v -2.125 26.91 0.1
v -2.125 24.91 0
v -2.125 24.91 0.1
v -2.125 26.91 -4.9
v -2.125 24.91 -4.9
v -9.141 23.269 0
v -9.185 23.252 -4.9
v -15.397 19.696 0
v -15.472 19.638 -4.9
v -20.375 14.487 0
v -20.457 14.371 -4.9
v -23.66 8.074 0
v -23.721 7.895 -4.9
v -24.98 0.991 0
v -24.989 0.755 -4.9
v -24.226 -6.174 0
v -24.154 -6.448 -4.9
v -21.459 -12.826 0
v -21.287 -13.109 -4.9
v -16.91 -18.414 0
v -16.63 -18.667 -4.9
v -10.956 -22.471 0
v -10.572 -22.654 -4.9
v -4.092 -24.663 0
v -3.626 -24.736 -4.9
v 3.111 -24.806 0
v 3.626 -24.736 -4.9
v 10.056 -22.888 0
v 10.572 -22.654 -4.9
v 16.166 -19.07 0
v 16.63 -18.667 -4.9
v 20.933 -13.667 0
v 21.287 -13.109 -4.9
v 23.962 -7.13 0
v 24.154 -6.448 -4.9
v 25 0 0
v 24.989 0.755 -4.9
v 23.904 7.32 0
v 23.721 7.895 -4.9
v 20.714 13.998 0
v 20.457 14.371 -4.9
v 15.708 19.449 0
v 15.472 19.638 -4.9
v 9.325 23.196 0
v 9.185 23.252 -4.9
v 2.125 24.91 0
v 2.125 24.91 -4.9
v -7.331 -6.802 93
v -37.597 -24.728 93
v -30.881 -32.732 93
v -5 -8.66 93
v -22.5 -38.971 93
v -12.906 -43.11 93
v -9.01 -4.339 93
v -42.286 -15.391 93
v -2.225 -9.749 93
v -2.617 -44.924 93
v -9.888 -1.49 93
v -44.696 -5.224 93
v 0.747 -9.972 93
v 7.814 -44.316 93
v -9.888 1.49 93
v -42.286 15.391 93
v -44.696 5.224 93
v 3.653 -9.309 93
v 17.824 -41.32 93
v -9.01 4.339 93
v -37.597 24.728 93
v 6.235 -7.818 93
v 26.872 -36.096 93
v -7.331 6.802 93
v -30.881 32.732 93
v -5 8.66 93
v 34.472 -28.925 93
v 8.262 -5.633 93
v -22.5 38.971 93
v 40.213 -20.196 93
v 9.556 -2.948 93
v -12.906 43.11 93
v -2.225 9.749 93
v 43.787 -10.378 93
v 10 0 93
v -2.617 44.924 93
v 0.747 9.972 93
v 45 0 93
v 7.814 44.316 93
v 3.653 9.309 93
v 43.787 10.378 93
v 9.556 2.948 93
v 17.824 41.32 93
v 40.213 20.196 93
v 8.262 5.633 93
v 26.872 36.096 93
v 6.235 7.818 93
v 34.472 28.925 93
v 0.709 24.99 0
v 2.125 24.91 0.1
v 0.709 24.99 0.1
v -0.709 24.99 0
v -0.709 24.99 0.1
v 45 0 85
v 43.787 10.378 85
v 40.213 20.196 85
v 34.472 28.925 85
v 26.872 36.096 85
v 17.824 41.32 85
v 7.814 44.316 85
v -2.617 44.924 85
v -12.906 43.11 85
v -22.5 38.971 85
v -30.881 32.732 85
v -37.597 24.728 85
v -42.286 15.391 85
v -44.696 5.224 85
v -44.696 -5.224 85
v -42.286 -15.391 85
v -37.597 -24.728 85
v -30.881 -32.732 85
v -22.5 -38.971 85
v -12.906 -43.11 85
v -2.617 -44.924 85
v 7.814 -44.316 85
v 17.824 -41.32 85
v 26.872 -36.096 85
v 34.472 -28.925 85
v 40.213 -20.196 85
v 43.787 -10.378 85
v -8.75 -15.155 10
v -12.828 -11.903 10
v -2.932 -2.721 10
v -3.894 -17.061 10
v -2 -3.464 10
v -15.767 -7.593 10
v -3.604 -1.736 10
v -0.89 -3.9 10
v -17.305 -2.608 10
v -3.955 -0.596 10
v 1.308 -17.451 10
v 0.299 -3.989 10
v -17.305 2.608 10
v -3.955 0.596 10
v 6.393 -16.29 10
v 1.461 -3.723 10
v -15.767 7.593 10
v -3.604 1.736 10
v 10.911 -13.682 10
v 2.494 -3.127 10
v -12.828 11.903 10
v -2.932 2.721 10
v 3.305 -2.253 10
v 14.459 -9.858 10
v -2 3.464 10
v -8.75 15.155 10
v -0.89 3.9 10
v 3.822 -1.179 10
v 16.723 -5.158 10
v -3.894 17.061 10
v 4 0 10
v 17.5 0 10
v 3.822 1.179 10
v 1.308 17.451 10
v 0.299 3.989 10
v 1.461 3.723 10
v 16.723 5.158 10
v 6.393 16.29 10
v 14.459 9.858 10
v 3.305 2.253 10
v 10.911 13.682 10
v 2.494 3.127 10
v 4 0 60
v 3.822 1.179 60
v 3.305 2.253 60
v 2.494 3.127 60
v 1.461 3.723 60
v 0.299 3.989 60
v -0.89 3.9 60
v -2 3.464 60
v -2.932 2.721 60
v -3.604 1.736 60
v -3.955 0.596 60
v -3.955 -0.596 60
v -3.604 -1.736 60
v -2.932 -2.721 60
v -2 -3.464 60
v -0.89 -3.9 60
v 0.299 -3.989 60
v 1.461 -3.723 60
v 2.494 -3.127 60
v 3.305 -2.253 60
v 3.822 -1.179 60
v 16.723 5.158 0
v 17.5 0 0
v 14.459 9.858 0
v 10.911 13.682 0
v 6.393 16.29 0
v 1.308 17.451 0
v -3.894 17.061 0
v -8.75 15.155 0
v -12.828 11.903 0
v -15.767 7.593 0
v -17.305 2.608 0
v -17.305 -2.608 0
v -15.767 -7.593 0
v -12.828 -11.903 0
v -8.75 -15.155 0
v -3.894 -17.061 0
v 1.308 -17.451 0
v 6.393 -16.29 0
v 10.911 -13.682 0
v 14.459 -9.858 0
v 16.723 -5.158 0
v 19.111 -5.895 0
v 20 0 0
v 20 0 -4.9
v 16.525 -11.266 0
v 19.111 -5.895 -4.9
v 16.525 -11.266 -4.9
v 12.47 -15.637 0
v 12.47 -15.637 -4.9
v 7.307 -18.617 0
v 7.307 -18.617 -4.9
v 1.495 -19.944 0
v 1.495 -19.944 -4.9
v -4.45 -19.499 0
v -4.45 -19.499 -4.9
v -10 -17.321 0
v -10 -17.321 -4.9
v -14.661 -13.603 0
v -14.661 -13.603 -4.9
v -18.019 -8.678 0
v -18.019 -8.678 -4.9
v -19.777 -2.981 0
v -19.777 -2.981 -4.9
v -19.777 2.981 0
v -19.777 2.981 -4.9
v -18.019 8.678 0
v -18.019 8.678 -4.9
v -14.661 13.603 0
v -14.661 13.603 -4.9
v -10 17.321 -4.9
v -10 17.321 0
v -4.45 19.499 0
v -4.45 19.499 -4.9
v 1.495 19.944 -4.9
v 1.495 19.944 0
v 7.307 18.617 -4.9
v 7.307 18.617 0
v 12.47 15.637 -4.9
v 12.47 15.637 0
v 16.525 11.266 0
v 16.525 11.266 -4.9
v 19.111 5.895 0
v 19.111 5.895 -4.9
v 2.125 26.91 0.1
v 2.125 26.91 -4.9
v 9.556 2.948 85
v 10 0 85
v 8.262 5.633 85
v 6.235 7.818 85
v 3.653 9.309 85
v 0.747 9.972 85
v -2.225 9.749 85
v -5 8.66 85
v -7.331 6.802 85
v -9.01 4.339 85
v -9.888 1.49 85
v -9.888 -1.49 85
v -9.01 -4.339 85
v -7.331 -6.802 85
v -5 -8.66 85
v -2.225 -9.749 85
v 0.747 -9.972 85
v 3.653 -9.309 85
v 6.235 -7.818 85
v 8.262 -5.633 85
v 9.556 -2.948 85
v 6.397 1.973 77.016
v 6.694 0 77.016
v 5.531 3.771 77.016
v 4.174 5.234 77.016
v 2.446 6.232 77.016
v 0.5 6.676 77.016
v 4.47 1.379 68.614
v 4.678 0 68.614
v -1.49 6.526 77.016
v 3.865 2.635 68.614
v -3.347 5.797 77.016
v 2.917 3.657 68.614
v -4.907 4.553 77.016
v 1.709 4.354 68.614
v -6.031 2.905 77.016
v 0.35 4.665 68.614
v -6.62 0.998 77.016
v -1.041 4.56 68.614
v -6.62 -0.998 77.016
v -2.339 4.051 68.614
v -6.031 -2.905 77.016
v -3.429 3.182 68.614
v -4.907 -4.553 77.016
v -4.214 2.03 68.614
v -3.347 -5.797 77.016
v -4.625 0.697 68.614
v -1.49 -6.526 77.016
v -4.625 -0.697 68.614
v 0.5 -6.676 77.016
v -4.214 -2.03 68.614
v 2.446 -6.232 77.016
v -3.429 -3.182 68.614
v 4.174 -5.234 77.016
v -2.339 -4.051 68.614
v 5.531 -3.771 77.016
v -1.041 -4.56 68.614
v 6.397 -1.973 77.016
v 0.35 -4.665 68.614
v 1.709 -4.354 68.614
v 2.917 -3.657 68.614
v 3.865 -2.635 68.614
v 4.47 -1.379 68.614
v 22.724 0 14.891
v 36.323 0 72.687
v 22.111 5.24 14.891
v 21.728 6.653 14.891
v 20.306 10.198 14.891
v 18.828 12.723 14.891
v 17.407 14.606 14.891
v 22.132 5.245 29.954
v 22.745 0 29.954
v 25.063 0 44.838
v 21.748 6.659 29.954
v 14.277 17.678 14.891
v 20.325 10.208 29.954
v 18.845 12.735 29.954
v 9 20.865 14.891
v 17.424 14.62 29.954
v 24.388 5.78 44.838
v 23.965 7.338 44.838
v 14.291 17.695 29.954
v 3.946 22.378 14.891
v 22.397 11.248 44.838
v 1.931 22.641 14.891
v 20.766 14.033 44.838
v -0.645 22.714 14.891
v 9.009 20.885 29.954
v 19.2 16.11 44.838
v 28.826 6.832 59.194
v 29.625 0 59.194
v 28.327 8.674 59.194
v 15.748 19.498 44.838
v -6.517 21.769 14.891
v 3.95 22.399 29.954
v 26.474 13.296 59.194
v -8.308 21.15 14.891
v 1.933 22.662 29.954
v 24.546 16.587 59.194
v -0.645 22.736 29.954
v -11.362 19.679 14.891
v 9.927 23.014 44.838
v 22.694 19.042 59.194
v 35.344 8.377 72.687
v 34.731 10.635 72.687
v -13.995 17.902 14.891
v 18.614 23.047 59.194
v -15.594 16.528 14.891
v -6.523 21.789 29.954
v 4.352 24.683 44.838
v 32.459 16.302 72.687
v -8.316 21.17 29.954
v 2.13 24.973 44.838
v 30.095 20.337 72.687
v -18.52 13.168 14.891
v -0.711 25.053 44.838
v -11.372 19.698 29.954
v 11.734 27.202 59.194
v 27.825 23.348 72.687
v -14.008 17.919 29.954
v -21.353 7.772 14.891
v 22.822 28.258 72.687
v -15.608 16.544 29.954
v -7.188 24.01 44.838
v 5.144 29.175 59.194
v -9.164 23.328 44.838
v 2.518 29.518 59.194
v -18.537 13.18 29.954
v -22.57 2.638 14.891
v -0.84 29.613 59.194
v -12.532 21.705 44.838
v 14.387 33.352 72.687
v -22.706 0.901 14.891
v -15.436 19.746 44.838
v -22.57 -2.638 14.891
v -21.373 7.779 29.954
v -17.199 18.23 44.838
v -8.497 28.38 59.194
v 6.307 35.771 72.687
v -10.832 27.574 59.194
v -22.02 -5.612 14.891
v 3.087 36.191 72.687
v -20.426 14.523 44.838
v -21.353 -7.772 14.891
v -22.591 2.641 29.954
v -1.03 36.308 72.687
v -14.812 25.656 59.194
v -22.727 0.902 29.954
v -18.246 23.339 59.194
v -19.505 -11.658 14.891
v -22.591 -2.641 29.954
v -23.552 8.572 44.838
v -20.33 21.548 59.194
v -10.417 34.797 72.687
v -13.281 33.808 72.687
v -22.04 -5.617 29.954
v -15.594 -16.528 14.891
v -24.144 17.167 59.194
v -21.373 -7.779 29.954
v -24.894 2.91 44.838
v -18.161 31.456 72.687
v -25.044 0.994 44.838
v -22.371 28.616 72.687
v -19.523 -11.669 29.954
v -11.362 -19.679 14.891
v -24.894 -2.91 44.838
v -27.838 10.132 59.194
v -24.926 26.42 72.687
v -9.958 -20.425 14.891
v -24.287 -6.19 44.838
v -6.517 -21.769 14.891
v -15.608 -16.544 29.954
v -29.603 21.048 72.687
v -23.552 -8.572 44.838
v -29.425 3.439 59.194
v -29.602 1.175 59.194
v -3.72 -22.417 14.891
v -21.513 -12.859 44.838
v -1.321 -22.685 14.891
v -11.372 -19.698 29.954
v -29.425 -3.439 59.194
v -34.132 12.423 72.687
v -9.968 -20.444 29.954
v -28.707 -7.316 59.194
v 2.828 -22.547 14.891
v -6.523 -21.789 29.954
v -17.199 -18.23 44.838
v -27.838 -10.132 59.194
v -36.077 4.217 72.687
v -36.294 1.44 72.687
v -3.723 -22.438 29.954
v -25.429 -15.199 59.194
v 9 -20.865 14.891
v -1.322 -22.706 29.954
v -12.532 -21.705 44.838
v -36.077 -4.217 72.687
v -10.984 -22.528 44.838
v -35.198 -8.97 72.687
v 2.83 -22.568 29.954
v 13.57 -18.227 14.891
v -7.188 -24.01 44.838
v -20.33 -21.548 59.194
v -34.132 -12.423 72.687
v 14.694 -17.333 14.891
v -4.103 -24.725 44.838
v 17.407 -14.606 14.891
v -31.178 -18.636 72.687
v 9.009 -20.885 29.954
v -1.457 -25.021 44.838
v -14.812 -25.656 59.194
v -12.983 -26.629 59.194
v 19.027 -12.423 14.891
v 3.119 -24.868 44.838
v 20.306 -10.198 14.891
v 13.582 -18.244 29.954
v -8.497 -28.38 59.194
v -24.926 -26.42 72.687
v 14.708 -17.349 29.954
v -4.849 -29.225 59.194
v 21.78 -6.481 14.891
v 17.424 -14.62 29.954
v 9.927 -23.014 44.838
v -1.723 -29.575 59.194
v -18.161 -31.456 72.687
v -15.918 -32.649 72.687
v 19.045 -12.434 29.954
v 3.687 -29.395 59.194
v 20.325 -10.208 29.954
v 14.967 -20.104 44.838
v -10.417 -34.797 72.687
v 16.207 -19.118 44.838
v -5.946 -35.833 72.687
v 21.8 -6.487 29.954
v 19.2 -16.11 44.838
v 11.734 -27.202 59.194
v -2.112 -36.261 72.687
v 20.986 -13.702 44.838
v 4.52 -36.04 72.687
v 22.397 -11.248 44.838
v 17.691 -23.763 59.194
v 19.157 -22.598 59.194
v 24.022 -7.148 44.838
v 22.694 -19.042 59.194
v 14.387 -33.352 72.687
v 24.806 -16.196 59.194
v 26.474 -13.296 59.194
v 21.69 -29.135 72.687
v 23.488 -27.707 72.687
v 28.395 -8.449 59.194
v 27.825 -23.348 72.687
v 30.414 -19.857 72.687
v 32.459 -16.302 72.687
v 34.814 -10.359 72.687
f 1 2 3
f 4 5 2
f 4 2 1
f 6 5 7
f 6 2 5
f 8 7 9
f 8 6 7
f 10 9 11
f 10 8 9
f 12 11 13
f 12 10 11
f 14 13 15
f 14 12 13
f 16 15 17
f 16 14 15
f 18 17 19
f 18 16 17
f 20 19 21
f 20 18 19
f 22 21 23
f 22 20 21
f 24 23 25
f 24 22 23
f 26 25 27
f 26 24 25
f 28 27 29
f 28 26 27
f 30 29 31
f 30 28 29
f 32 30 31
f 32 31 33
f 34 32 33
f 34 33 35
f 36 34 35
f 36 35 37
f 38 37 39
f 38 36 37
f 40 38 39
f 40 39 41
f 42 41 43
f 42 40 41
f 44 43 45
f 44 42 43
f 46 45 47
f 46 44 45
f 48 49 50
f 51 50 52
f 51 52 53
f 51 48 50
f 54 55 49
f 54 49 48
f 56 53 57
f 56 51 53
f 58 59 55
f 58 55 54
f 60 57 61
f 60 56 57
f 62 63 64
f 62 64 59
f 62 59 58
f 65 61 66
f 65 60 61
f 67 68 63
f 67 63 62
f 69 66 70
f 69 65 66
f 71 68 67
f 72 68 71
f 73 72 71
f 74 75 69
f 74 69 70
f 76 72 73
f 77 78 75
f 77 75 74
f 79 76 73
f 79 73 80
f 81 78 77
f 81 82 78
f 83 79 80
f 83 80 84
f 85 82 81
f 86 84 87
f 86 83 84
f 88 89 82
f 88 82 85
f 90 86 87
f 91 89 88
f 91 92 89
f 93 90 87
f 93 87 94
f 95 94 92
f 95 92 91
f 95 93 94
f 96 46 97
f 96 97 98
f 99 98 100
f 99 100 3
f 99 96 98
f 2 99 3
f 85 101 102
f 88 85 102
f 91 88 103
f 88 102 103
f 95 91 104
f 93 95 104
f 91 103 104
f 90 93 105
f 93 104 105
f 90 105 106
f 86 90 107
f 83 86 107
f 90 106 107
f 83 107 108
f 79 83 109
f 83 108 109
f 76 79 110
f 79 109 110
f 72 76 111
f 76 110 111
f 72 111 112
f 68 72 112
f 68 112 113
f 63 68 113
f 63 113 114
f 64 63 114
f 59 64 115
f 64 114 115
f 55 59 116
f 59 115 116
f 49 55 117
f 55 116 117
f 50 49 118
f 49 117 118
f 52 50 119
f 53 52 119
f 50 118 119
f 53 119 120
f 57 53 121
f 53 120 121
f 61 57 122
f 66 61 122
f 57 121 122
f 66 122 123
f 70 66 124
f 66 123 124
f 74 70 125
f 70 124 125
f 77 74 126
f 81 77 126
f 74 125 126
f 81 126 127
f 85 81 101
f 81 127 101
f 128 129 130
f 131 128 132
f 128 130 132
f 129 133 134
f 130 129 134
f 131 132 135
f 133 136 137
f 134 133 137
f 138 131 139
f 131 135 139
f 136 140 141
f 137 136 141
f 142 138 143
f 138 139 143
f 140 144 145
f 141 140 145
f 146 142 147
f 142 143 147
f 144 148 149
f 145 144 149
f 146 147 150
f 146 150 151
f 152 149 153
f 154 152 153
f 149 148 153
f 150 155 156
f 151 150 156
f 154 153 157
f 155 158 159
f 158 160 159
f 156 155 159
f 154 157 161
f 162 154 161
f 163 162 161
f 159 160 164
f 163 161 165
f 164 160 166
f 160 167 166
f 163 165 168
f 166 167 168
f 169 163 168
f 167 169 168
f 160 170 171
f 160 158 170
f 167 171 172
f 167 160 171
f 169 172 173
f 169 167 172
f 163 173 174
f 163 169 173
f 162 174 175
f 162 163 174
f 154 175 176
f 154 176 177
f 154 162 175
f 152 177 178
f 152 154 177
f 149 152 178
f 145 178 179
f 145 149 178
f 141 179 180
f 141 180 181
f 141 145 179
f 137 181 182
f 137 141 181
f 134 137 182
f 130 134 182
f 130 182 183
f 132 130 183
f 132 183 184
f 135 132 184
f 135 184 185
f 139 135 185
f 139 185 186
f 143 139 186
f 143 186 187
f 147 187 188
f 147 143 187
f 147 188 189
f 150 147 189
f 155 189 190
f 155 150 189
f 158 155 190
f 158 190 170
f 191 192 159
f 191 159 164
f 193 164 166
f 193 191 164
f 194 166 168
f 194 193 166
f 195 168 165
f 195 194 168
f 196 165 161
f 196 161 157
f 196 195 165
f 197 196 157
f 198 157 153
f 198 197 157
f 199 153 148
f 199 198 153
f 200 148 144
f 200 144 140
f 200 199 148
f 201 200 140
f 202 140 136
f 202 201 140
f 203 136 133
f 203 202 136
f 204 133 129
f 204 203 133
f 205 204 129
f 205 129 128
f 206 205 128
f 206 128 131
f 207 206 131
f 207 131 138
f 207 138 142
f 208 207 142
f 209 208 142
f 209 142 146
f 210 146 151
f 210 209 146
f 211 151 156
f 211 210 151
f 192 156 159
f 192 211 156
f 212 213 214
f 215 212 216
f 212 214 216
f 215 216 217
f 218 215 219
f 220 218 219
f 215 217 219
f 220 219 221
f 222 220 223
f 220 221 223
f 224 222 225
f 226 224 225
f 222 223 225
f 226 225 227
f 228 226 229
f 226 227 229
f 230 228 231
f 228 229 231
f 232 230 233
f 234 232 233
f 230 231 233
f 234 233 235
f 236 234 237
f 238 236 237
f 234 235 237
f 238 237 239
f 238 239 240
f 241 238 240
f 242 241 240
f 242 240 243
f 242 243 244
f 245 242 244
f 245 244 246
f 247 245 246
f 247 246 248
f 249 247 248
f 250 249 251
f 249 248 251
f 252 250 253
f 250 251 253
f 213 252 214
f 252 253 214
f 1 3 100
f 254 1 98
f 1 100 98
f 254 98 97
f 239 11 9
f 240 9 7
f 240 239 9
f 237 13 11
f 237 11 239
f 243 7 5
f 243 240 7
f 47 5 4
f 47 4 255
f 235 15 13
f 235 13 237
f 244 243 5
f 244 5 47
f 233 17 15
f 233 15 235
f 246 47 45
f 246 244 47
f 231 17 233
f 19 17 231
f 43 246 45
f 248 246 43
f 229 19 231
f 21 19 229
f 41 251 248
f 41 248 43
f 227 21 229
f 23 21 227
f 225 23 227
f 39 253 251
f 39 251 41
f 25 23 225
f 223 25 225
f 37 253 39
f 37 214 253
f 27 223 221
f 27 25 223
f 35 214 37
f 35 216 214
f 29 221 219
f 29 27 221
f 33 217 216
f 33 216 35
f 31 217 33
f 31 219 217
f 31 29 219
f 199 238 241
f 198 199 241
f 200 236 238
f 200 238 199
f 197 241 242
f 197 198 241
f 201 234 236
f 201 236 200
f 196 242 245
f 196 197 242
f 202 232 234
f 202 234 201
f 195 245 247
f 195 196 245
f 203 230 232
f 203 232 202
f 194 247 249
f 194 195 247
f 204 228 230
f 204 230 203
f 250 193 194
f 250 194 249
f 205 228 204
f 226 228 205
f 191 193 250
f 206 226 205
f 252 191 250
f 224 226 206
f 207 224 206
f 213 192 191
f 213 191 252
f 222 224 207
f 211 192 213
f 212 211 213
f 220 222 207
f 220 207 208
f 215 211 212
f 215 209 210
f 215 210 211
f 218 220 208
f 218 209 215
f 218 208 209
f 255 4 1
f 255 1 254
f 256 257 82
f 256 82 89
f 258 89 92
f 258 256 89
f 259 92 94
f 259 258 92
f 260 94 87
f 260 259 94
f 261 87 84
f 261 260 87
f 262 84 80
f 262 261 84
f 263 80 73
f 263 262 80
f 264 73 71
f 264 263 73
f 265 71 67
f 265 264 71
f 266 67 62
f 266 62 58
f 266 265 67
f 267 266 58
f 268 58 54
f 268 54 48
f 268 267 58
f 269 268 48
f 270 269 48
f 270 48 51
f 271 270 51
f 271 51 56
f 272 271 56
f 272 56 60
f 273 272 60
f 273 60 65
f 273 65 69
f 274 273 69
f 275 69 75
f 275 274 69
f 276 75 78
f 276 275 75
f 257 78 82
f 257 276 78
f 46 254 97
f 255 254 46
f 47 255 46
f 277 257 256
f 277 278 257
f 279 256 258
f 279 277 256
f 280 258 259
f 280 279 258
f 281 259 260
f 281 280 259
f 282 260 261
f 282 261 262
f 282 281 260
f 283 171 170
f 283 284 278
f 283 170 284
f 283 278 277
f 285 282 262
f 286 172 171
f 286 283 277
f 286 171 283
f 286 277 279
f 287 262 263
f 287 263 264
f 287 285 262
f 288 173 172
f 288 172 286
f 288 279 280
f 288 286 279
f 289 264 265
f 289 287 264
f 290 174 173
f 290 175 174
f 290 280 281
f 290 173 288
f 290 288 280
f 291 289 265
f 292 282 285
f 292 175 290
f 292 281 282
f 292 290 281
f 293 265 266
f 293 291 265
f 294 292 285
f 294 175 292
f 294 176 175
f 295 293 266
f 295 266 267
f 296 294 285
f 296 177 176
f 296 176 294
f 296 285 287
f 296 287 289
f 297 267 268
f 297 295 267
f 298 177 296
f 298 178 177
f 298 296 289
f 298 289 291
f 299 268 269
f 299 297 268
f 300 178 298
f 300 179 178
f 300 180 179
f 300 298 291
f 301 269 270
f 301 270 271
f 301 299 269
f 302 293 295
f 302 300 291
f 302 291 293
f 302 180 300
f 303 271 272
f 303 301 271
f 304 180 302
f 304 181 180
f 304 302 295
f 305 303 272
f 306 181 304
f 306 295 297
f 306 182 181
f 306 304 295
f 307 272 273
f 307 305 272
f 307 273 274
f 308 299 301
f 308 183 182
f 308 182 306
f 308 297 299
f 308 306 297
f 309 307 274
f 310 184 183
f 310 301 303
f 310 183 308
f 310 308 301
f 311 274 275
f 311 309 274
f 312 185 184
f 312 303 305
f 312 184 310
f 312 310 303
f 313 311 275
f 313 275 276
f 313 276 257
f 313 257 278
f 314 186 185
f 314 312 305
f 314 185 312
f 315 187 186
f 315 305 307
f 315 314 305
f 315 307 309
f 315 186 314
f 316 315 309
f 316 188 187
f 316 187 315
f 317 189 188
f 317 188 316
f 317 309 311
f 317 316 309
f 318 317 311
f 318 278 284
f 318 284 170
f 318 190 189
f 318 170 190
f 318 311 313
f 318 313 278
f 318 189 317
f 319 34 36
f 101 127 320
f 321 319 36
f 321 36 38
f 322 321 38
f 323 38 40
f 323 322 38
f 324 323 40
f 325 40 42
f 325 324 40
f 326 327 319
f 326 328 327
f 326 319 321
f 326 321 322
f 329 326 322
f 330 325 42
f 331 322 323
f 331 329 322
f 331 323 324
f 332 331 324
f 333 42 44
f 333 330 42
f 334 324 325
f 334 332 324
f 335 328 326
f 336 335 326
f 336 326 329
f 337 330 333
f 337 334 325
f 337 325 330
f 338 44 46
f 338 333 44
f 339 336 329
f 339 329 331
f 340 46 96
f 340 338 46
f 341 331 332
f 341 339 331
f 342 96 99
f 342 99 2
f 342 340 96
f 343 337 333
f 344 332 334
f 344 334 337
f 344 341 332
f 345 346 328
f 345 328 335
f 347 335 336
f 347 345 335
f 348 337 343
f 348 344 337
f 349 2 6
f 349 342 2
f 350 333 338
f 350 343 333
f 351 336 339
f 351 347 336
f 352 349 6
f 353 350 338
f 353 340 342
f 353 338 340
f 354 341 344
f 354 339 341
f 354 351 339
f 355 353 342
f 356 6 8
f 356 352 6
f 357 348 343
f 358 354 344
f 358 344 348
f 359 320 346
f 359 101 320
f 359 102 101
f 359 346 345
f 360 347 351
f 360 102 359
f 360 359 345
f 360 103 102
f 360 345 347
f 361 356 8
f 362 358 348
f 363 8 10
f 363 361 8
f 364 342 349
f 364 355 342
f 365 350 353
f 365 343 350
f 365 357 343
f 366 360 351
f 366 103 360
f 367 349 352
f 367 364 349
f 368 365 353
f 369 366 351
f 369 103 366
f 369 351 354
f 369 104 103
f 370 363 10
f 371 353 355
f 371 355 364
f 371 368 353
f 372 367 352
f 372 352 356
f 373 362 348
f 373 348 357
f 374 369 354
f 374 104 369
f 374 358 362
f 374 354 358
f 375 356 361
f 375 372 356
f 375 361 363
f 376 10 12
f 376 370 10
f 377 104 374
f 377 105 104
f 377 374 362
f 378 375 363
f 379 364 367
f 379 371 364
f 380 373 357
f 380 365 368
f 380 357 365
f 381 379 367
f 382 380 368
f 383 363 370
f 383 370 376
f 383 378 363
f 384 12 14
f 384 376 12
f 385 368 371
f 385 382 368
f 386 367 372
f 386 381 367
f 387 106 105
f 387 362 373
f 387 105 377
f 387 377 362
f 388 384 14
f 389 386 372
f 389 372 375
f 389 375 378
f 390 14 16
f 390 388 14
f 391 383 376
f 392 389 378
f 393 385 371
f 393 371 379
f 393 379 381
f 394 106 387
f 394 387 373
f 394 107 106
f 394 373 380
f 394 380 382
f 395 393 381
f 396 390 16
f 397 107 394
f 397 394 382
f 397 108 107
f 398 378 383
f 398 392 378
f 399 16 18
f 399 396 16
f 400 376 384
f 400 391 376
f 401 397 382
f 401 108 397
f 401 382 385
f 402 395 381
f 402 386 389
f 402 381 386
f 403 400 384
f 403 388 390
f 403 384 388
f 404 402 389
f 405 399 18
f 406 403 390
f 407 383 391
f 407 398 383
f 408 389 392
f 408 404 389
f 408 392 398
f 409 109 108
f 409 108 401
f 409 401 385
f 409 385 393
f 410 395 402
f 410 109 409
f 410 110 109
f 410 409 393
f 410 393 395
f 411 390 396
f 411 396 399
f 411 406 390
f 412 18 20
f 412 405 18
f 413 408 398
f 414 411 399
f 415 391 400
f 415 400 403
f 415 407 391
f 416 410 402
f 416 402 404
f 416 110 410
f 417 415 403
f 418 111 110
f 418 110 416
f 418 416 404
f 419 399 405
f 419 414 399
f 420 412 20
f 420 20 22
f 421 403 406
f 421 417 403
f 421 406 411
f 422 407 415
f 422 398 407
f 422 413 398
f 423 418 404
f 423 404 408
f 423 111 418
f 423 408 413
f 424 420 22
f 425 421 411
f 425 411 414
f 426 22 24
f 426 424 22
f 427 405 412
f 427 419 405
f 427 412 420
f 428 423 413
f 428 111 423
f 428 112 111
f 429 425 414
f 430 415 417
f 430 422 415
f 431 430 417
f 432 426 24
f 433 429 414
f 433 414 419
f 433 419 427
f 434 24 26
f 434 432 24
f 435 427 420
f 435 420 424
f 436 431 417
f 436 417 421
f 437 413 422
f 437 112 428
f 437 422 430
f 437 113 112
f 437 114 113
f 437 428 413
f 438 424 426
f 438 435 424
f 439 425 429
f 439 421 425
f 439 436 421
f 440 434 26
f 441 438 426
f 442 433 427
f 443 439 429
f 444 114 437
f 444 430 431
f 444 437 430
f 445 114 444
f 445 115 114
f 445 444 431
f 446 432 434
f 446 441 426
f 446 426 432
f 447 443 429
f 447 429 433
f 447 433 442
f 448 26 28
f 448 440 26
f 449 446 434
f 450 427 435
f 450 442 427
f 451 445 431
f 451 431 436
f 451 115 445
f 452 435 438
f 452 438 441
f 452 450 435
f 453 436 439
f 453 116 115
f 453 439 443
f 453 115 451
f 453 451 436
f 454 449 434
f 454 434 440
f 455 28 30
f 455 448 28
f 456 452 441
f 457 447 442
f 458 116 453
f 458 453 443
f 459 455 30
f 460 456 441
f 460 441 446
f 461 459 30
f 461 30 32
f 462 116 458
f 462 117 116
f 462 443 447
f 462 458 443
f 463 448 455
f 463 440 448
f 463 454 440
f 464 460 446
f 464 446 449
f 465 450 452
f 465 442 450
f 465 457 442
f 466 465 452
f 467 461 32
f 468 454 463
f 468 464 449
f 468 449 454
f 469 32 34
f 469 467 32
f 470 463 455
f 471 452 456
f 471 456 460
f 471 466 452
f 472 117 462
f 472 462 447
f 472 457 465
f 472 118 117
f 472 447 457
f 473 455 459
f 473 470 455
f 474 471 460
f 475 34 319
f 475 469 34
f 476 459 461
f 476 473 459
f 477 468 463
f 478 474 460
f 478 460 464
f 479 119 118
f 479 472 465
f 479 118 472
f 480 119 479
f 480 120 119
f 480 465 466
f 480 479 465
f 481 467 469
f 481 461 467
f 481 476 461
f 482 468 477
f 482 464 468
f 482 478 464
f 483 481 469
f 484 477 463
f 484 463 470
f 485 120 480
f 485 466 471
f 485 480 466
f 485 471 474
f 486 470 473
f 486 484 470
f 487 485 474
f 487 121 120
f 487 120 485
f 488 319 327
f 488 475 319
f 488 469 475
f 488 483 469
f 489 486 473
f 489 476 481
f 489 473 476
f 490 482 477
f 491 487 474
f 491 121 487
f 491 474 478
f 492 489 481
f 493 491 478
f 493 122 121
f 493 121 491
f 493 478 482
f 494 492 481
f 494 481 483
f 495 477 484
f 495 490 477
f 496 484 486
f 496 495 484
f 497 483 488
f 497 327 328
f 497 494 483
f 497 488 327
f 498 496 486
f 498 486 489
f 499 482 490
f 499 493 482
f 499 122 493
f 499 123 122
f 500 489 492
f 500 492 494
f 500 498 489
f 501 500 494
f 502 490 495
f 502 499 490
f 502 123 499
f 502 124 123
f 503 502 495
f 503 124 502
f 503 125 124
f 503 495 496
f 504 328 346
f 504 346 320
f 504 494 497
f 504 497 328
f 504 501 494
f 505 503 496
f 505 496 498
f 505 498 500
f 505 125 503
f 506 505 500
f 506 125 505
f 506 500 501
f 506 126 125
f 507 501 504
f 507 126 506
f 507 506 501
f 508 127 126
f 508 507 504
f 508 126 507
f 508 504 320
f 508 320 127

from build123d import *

# Parameters (mm, degrees)
F3_DEPTH  = 4.9
F4_R      = 20
F4_R_2    = 4
F5_DEPTH  = 4.9
F6_DEPTH  = 8
F7_R      = 17.5
F8_DEPTH  = 10
F10_DEPTH = 5


with BuildPart() as f2:
    # F0 (on Front) → F2 (revolve)
    with BuildSketch(Plane.XZ):
        with BuildLine():
            Line((4, 0), (25, 0))
            ThreePointArc((25, 0), (25.0633115181, 44.8380443487), (45, 85))
            Line((45, 85), (10, 85))
            ThreePointArc((10, 85), (5.5209994492, 72.8549601322), (4, 60))
            Line((4, 60), (4, 0))
        make_face()
    revolve(axis=Axis((0, 0, 25.1682717353), (0, 0, 1)))

    # F3 (add): a face of the model
    f3_faces = [f2.faces().sort_by_distance(p)[0] for p in [
        (-4.7071067812, 0, 0),
    ]]
    extrude(f3_faces, amount=F3_DEPTH)

    # F4 (on face) → F5 (cut)
    with BuildSketch(Plane(origin=(0, 0, -4.9), x_dir=(1, 0, 0), z_dir=(0, 0, -1))):
        Circle(F4_R)
        Circle(F4_R_2, mode=Mode.SUBTRACT)
    extrude(amount=-F5_DEPTH, mode=Mode.SUBTRACT)

    # F6 (add): a face of the model
    f6_faces = [f2.faces().sort_by_distance(p)[0] for p in [
        (-43.7272077939, 0, 85),
    ]]
    extrude(f6_faces, amount=F6_DEPTH)

    # F7 (on Top) → F8 (cut)
    with BuildSketch(Plane.XY):
        Circle(F7_R)
    extrude(amount=F8_DEPTH, mode=Mode.SUBTRACT)

    # F9 (on face) → F10 (join)
    with BuildSketch(Plane(origin=(0, 0, -4.9), x_dir=(1, 0, 0), z_dir=(0, 0, -1))):
        with BuildLine():
            ThreePointArc((2.125, -24.9095237811), (0, -25), (-2.125, -24.9095237811))
            Line((-2.125, -24.9095237811), (-2.125, -26.9095237811))
            Line((-2.125, -26.9095237811), (2.125, -26.9095237811))
            Line((2.125, -26.9095237811), (2.125, -24.9095237811))
        make_face()
    extrude(amount=-F10_DEPTH)


solid = f2.part
